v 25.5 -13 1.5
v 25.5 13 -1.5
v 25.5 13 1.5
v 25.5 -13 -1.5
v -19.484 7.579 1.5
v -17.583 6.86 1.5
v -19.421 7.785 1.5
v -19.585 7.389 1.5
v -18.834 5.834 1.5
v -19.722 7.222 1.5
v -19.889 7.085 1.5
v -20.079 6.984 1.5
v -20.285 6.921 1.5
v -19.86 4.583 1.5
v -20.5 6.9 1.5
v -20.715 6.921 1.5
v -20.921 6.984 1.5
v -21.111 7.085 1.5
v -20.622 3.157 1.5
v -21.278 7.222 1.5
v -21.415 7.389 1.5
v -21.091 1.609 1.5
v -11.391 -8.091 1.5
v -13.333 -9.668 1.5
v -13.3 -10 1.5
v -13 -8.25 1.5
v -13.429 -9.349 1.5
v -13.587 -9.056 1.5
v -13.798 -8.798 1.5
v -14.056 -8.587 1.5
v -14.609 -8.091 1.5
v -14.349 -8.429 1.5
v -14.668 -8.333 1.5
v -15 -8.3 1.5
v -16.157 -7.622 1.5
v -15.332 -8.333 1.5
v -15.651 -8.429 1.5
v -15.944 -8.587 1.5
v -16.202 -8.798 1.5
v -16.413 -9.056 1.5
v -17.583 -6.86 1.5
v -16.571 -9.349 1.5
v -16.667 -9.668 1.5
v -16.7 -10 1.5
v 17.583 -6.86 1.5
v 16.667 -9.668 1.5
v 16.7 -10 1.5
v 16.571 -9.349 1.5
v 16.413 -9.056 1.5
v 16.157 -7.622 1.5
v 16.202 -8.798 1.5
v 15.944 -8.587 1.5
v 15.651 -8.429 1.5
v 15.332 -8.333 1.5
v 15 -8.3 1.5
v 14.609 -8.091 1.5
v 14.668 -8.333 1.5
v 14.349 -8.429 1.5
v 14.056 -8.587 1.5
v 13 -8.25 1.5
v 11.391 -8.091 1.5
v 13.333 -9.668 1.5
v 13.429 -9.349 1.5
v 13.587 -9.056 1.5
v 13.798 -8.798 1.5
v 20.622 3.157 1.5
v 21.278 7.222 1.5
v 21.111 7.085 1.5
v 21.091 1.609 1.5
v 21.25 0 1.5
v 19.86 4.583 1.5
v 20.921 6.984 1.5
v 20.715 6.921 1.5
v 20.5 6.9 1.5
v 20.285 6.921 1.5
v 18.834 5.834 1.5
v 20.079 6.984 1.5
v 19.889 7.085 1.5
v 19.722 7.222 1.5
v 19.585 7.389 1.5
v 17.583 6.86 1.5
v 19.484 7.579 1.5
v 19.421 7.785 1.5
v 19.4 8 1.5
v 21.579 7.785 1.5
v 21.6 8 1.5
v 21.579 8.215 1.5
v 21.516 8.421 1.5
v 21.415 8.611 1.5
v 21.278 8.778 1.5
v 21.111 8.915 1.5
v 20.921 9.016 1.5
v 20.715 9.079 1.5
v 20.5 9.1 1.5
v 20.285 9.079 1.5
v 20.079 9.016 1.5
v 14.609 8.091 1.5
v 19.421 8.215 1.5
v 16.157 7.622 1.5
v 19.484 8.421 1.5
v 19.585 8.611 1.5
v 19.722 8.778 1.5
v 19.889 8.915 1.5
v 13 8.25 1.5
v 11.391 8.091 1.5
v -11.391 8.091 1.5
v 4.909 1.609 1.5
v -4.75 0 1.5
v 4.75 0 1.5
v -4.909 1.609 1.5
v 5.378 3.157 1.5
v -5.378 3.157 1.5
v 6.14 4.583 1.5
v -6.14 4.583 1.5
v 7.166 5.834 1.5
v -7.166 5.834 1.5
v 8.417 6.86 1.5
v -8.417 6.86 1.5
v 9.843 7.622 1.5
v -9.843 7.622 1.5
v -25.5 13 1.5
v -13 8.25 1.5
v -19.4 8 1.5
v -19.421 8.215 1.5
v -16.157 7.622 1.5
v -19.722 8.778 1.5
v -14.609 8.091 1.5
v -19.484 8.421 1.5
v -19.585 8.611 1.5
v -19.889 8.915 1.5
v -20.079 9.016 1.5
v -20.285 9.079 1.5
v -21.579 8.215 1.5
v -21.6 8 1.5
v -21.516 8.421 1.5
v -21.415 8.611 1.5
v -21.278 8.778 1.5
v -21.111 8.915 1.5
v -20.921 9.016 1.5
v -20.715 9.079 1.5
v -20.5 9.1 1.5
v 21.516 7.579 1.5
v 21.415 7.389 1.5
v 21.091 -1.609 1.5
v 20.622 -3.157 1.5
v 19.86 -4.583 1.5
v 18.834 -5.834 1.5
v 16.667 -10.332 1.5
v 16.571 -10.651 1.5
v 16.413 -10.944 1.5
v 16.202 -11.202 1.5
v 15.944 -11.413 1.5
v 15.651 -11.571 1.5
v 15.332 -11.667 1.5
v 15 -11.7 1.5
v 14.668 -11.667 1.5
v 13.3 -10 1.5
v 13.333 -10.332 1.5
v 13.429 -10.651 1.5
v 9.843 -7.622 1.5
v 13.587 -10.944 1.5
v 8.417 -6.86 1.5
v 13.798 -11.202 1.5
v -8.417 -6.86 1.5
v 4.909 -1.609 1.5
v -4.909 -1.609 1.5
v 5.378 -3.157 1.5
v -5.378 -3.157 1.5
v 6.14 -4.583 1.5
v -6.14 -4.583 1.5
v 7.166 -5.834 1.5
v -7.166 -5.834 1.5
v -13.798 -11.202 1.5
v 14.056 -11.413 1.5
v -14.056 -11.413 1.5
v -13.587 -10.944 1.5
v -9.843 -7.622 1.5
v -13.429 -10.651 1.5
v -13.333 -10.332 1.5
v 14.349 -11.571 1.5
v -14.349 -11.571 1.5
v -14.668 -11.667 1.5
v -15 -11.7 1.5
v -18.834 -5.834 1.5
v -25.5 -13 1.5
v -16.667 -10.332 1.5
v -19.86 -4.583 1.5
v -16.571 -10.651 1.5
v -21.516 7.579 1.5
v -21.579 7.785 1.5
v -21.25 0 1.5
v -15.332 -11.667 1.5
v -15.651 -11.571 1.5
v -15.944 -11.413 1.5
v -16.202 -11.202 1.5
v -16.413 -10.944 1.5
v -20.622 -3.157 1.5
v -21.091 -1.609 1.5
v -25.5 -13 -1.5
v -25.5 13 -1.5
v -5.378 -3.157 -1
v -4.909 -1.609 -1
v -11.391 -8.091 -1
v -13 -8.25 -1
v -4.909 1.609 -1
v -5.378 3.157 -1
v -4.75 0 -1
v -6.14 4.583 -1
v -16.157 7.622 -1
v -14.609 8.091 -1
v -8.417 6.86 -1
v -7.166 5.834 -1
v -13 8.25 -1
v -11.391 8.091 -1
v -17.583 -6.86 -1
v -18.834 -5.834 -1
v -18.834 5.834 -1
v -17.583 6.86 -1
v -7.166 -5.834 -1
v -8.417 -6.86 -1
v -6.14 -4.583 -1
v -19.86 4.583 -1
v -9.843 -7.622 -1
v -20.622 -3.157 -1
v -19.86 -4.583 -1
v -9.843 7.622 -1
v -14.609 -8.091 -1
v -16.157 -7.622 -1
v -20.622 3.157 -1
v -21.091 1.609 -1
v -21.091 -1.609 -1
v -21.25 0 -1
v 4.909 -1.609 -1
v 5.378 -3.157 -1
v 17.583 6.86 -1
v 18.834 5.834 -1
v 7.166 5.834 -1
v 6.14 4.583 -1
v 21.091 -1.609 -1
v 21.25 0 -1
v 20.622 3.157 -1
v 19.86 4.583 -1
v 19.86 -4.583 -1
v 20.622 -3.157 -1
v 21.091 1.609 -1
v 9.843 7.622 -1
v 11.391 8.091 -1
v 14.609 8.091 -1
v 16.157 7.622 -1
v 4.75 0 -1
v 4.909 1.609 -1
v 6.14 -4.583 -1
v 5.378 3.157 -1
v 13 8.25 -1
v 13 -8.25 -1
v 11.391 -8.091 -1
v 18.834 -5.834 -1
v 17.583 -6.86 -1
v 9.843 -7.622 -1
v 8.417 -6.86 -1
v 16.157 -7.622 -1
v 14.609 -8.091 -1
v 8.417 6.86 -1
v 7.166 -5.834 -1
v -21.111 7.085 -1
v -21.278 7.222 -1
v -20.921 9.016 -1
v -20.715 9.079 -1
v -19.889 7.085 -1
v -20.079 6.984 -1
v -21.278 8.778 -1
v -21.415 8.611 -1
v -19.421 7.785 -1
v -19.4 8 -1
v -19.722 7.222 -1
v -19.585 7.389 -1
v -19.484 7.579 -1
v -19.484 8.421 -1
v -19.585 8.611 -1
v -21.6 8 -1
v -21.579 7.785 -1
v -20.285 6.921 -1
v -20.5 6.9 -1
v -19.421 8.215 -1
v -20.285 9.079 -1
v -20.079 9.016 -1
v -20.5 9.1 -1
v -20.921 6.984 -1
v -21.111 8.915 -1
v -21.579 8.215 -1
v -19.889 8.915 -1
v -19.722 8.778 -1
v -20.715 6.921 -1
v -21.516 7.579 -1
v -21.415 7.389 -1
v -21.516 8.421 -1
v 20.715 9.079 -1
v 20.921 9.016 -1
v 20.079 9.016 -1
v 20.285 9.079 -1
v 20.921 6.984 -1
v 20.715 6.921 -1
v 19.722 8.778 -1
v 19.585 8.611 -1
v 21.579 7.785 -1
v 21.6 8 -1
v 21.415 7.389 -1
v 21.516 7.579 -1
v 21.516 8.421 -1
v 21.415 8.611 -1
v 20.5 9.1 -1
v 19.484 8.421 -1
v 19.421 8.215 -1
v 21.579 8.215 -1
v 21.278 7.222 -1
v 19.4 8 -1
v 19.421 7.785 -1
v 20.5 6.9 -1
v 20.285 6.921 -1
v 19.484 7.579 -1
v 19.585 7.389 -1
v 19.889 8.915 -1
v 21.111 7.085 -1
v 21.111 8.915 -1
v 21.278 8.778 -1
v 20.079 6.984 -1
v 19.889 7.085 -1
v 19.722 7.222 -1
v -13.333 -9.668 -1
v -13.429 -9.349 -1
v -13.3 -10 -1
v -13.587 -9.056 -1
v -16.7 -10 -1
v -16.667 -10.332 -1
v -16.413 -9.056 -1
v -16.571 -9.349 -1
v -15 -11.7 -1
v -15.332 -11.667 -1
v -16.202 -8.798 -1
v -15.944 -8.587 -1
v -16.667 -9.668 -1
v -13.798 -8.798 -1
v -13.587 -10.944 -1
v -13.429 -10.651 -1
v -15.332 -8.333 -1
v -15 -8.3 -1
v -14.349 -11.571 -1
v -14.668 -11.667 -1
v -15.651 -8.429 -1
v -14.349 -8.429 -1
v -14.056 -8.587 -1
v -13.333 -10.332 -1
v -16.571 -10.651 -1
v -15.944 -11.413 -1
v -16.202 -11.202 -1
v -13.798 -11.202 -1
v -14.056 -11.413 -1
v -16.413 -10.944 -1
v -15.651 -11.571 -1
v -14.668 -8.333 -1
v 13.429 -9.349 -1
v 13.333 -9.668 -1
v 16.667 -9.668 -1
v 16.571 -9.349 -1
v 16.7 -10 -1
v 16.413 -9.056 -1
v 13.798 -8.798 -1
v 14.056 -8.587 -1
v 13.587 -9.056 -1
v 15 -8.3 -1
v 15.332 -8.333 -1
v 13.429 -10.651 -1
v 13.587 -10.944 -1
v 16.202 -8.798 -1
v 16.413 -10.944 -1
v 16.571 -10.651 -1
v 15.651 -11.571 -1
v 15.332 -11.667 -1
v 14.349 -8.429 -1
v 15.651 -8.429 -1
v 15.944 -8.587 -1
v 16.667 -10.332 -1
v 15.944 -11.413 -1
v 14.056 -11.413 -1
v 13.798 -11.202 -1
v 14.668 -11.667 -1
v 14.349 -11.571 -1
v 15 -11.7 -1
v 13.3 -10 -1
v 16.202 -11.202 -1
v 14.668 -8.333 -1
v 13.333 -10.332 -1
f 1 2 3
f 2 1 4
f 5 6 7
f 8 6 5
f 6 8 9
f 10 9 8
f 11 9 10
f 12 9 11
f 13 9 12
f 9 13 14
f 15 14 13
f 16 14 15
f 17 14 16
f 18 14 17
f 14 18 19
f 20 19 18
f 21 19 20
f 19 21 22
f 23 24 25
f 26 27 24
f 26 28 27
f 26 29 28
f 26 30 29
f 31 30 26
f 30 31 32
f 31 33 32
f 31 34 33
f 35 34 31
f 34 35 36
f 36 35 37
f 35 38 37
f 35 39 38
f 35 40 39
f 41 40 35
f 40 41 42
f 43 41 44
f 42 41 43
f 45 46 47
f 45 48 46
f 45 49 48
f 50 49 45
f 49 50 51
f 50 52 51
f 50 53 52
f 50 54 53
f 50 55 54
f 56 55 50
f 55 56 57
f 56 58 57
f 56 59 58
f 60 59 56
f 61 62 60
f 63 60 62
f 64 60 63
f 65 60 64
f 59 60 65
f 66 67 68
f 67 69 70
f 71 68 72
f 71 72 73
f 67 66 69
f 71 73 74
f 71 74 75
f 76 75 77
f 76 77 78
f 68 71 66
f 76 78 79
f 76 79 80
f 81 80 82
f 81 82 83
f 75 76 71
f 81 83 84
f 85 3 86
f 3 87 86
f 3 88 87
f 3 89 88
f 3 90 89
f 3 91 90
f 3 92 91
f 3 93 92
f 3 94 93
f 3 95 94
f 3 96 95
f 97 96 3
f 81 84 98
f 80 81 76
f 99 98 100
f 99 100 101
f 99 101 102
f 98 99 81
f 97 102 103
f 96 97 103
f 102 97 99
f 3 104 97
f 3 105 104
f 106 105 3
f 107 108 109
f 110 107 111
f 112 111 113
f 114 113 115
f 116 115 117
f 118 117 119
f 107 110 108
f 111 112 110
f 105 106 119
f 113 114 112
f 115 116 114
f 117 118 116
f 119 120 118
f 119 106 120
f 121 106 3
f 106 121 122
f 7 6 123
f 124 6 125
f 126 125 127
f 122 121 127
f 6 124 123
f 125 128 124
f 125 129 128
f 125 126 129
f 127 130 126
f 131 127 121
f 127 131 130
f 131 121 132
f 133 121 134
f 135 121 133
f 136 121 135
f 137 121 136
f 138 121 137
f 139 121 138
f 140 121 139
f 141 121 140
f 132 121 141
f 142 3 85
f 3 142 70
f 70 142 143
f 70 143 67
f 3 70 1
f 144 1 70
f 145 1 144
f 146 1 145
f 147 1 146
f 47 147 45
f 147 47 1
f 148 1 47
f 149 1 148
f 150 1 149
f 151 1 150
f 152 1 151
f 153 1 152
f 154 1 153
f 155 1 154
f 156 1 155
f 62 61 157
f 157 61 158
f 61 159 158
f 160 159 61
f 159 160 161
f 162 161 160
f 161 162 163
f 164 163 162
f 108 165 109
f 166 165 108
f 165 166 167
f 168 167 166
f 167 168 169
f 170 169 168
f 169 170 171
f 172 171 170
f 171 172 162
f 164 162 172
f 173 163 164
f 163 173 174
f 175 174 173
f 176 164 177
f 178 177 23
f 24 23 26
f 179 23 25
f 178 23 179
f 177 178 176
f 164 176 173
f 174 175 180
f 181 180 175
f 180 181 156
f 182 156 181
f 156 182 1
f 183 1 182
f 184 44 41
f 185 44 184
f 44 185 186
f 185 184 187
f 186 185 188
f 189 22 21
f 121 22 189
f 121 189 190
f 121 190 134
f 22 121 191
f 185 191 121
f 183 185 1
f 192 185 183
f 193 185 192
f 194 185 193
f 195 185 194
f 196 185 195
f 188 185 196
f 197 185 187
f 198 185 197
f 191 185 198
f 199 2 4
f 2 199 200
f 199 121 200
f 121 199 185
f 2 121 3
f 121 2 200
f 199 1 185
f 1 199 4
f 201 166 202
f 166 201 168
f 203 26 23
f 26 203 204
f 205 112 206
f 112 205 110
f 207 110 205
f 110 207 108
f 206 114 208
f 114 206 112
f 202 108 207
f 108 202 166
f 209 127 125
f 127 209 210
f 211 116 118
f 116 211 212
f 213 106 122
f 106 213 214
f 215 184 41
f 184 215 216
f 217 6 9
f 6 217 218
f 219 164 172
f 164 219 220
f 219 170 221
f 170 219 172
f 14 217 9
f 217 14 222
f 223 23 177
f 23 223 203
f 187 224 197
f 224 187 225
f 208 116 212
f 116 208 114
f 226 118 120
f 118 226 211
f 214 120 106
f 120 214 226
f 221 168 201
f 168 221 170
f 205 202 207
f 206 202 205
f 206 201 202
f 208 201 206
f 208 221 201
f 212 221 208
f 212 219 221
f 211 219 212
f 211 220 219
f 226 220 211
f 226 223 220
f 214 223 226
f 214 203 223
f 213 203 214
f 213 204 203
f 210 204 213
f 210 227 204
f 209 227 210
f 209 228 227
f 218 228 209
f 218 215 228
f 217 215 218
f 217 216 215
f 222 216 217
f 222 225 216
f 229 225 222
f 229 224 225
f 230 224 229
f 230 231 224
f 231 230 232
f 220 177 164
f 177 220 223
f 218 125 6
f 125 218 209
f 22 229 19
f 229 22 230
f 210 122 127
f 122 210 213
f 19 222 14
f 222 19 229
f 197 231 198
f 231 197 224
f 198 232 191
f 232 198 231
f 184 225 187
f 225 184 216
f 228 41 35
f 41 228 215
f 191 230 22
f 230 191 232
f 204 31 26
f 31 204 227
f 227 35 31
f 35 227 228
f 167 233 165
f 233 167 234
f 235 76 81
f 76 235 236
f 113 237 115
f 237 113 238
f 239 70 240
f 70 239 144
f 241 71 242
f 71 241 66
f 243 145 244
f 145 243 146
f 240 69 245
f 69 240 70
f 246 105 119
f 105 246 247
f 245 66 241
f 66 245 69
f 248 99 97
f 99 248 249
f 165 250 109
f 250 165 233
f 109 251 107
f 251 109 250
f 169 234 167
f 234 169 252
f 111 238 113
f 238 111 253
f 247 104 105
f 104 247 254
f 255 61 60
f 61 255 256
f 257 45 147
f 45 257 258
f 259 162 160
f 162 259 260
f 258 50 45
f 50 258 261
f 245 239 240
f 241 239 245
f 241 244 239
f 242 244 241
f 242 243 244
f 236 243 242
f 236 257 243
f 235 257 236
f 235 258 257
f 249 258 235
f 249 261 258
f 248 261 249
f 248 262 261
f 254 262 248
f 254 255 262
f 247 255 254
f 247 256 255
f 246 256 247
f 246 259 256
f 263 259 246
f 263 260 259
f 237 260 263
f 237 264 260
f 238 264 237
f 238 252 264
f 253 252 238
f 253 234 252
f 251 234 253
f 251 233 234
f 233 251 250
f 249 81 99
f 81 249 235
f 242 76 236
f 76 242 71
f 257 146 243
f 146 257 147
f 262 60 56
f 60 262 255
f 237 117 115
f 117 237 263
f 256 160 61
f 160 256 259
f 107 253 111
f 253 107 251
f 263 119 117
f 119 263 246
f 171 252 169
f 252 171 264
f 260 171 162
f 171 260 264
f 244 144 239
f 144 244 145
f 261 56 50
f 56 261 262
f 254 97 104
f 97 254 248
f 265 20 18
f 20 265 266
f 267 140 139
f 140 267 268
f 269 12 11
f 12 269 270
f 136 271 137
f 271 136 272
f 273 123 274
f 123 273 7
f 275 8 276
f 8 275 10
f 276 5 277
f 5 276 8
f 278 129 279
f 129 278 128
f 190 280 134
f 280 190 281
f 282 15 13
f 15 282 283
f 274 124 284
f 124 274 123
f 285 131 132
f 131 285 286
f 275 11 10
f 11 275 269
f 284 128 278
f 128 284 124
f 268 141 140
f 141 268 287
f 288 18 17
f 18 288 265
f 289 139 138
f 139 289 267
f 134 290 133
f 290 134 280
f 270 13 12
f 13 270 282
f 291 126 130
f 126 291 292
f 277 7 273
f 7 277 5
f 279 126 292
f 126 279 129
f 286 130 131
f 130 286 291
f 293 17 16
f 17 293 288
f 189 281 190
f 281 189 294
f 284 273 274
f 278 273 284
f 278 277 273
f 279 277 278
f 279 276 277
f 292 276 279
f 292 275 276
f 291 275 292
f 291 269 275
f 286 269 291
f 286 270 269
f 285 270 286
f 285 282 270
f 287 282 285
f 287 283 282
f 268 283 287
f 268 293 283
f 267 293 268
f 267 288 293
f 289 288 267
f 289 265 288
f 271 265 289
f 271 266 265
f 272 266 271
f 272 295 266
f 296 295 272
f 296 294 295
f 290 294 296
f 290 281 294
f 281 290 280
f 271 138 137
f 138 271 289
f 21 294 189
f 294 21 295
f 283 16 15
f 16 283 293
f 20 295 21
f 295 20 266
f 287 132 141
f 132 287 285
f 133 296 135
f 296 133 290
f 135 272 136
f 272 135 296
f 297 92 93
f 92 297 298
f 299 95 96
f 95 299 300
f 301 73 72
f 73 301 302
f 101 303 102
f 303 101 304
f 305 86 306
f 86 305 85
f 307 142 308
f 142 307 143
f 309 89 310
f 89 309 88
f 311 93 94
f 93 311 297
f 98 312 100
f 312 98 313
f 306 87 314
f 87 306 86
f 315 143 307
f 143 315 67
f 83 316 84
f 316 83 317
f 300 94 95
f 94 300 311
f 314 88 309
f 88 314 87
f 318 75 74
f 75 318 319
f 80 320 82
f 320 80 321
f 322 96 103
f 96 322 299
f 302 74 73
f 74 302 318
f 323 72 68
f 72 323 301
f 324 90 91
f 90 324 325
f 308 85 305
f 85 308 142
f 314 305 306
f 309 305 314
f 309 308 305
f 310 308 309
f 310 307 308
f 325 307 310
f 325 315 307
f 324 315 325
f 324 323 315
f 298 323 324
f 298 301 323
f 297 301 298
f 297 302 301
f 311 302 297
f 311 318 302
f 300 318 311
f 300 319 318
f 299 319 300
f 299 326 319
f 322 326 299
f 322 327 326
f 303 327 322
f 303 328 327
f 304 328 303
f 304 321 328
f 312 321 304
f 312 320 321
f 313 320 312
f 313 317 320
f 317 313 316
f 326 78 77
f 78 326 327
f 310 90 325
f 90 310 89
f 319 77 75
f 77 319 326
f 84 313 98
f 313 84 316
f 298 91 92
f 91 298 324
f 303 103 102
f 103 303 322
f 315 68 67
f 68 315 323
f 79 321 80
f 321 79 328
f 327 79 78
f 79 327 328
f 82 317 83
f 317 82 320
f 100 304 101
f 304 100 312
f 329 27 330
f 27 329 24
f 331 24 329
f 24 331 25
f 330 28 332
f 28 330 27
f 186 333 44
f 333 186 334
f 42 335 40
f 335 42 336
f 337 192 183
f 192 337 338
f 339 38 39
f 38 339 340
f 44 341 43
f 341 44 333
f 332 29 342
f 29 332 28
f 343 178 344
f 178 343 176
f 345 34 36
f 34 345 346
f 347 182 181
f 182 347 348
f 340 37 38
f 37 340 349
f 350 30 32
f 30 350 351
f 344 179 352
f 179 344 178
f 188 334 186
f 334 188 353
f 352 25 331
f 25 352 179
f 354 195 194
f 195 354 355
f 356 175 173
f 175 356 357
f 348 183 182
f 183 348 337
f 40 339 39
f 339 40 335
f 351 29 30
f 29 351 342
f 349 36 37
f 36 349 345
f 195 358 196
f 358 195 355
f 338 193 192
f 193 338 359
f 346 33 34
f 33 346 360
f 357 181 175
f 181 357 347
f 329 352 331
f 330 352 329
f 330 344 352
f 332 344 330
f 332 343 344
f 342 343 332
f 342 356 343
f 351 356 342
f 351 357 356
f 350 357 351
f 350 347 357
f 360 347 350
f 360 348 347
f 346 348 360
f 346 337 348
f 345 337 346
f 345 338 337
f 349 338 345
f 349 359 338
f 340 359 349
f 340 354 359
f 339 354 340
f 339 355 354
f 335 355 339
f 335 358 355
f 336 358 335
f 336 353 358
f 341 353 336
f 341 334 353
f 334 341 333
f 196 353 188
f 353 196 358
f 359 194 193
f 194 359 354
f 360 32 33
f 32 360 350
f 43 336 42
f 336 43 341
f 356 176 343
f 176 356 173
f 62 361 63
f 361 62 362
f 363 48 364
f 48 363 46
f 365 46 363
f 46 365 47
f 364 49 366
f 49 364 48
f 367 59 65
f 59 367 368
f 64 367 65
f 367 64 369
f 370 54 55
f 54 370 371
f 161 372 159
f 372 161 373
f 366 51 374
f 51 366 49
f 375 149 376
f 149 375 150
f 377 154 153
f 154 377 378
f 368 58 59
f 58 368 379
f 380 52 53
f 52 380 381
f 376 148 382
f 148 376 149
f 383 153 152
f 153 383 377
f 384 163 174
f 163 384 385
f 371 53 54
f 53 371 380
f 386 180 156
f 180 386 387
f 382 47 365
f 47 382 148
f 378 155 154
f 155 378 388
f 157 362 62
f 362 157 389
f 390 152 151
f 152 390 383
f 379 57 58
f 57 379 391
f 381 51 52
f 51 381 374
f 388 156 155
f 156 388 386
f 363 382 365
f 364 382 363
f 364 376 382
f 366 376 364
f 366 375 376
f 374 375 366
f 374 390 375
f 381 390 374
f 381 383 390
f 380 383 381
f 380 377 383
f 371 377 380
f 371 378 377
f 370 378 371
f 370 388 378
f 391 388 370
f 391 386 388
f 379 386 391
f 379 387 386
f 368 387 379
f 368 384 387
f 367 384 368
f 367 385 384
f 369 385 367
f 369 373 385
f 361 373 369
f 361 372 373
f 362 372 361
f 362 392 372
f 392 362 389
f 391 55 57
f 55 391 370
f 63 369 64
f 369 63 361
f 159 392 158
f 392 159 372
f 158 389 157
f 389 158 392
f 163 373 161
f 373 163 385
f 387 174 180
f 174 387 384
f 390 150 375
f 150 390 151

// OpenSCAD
// suport_hcsr04.scad
// Suport frontal del sensor d'ultrasons HC-SR04 per al rover (T3), cargolat
// al davant del xassis del vehicle ja muntat (Sessio 0, vegeu
// Classes/00_General/00_Projecte_T3_Rover.md). Peca nova, petita: NO hi ha
// plantilla laser (vegeu Recursos/plantilles_laser/README.md).
// Material recomanat: PLA. 1 unitat per rover.

// --- Parametres (mm) ---
// Placa del sensor HC-SR04: 45 x 20 mm (mida real del modul).
amplada_sensor = 45;
alcada_sensor = 20;
gruix_placa = 3;
marge = 3;                     // vora al voltant del sensor
separacio_forats_sensor = 41;  // distancia entre els 2 forats de muntatge del modul (estandard HC-SR04)
diametre_ulls = 16.5;          // diametre de cada "ull" (transductor) del sensor
separacio_ulls = 26;           // distancia entre centres dels 2 ulls
forat_m3 = 3.4;                // forats per cargolar el suport al xassis
separacio_forats_xassis = 30;  // coincideix amb els forats "SUPORT HC-SR04" previstos al xassis
$fn = 32;

module placa_suport() {
    difference() {
        cube([amplada_sensor + marge * 2, alcada_sensor + marge * 2, gruix_placa],
             center = true);
        // finestra pels 2 ulls del sensor
        translate([-separacio_ulls / 2, 0, -1])
            cylinder(h = gruix_placa + 2, d = diametre_ulls);
        translate([separacio_ulls / 2, 0, -1])
            cylinder(h = gruix_placa + 2, d = diametre_ulls);
        // forats de muntatge del modul HC-SR04
        translate([-separacio_forats_sensor / 2, alcada_sensor / 2 - 2, -1])
            cylinder(h = gruix_placa + 2, d = 2.2);
        translate([separacio_forats_sensor / 2, alcada_sensor / 2 - 2, -1])
            cylinder(h = gruix_placa + 2, d = 2.2);
        // forats M3 per fixar el suport al xassis
        translate([-separacio_forats_xassis / 2, -(alcada_sensor / 2 + marge - 3), -1])
            cylinder(h = gruix_placa + 2, d = forat_m3);
        translate([separacio_forats_xassis / 2, -(alcada_sensor / 2 + marge - 3), -1])
            cylinder(h = gruix_placa + 2, d = forat_m3);
    }
}

placa_suport();
